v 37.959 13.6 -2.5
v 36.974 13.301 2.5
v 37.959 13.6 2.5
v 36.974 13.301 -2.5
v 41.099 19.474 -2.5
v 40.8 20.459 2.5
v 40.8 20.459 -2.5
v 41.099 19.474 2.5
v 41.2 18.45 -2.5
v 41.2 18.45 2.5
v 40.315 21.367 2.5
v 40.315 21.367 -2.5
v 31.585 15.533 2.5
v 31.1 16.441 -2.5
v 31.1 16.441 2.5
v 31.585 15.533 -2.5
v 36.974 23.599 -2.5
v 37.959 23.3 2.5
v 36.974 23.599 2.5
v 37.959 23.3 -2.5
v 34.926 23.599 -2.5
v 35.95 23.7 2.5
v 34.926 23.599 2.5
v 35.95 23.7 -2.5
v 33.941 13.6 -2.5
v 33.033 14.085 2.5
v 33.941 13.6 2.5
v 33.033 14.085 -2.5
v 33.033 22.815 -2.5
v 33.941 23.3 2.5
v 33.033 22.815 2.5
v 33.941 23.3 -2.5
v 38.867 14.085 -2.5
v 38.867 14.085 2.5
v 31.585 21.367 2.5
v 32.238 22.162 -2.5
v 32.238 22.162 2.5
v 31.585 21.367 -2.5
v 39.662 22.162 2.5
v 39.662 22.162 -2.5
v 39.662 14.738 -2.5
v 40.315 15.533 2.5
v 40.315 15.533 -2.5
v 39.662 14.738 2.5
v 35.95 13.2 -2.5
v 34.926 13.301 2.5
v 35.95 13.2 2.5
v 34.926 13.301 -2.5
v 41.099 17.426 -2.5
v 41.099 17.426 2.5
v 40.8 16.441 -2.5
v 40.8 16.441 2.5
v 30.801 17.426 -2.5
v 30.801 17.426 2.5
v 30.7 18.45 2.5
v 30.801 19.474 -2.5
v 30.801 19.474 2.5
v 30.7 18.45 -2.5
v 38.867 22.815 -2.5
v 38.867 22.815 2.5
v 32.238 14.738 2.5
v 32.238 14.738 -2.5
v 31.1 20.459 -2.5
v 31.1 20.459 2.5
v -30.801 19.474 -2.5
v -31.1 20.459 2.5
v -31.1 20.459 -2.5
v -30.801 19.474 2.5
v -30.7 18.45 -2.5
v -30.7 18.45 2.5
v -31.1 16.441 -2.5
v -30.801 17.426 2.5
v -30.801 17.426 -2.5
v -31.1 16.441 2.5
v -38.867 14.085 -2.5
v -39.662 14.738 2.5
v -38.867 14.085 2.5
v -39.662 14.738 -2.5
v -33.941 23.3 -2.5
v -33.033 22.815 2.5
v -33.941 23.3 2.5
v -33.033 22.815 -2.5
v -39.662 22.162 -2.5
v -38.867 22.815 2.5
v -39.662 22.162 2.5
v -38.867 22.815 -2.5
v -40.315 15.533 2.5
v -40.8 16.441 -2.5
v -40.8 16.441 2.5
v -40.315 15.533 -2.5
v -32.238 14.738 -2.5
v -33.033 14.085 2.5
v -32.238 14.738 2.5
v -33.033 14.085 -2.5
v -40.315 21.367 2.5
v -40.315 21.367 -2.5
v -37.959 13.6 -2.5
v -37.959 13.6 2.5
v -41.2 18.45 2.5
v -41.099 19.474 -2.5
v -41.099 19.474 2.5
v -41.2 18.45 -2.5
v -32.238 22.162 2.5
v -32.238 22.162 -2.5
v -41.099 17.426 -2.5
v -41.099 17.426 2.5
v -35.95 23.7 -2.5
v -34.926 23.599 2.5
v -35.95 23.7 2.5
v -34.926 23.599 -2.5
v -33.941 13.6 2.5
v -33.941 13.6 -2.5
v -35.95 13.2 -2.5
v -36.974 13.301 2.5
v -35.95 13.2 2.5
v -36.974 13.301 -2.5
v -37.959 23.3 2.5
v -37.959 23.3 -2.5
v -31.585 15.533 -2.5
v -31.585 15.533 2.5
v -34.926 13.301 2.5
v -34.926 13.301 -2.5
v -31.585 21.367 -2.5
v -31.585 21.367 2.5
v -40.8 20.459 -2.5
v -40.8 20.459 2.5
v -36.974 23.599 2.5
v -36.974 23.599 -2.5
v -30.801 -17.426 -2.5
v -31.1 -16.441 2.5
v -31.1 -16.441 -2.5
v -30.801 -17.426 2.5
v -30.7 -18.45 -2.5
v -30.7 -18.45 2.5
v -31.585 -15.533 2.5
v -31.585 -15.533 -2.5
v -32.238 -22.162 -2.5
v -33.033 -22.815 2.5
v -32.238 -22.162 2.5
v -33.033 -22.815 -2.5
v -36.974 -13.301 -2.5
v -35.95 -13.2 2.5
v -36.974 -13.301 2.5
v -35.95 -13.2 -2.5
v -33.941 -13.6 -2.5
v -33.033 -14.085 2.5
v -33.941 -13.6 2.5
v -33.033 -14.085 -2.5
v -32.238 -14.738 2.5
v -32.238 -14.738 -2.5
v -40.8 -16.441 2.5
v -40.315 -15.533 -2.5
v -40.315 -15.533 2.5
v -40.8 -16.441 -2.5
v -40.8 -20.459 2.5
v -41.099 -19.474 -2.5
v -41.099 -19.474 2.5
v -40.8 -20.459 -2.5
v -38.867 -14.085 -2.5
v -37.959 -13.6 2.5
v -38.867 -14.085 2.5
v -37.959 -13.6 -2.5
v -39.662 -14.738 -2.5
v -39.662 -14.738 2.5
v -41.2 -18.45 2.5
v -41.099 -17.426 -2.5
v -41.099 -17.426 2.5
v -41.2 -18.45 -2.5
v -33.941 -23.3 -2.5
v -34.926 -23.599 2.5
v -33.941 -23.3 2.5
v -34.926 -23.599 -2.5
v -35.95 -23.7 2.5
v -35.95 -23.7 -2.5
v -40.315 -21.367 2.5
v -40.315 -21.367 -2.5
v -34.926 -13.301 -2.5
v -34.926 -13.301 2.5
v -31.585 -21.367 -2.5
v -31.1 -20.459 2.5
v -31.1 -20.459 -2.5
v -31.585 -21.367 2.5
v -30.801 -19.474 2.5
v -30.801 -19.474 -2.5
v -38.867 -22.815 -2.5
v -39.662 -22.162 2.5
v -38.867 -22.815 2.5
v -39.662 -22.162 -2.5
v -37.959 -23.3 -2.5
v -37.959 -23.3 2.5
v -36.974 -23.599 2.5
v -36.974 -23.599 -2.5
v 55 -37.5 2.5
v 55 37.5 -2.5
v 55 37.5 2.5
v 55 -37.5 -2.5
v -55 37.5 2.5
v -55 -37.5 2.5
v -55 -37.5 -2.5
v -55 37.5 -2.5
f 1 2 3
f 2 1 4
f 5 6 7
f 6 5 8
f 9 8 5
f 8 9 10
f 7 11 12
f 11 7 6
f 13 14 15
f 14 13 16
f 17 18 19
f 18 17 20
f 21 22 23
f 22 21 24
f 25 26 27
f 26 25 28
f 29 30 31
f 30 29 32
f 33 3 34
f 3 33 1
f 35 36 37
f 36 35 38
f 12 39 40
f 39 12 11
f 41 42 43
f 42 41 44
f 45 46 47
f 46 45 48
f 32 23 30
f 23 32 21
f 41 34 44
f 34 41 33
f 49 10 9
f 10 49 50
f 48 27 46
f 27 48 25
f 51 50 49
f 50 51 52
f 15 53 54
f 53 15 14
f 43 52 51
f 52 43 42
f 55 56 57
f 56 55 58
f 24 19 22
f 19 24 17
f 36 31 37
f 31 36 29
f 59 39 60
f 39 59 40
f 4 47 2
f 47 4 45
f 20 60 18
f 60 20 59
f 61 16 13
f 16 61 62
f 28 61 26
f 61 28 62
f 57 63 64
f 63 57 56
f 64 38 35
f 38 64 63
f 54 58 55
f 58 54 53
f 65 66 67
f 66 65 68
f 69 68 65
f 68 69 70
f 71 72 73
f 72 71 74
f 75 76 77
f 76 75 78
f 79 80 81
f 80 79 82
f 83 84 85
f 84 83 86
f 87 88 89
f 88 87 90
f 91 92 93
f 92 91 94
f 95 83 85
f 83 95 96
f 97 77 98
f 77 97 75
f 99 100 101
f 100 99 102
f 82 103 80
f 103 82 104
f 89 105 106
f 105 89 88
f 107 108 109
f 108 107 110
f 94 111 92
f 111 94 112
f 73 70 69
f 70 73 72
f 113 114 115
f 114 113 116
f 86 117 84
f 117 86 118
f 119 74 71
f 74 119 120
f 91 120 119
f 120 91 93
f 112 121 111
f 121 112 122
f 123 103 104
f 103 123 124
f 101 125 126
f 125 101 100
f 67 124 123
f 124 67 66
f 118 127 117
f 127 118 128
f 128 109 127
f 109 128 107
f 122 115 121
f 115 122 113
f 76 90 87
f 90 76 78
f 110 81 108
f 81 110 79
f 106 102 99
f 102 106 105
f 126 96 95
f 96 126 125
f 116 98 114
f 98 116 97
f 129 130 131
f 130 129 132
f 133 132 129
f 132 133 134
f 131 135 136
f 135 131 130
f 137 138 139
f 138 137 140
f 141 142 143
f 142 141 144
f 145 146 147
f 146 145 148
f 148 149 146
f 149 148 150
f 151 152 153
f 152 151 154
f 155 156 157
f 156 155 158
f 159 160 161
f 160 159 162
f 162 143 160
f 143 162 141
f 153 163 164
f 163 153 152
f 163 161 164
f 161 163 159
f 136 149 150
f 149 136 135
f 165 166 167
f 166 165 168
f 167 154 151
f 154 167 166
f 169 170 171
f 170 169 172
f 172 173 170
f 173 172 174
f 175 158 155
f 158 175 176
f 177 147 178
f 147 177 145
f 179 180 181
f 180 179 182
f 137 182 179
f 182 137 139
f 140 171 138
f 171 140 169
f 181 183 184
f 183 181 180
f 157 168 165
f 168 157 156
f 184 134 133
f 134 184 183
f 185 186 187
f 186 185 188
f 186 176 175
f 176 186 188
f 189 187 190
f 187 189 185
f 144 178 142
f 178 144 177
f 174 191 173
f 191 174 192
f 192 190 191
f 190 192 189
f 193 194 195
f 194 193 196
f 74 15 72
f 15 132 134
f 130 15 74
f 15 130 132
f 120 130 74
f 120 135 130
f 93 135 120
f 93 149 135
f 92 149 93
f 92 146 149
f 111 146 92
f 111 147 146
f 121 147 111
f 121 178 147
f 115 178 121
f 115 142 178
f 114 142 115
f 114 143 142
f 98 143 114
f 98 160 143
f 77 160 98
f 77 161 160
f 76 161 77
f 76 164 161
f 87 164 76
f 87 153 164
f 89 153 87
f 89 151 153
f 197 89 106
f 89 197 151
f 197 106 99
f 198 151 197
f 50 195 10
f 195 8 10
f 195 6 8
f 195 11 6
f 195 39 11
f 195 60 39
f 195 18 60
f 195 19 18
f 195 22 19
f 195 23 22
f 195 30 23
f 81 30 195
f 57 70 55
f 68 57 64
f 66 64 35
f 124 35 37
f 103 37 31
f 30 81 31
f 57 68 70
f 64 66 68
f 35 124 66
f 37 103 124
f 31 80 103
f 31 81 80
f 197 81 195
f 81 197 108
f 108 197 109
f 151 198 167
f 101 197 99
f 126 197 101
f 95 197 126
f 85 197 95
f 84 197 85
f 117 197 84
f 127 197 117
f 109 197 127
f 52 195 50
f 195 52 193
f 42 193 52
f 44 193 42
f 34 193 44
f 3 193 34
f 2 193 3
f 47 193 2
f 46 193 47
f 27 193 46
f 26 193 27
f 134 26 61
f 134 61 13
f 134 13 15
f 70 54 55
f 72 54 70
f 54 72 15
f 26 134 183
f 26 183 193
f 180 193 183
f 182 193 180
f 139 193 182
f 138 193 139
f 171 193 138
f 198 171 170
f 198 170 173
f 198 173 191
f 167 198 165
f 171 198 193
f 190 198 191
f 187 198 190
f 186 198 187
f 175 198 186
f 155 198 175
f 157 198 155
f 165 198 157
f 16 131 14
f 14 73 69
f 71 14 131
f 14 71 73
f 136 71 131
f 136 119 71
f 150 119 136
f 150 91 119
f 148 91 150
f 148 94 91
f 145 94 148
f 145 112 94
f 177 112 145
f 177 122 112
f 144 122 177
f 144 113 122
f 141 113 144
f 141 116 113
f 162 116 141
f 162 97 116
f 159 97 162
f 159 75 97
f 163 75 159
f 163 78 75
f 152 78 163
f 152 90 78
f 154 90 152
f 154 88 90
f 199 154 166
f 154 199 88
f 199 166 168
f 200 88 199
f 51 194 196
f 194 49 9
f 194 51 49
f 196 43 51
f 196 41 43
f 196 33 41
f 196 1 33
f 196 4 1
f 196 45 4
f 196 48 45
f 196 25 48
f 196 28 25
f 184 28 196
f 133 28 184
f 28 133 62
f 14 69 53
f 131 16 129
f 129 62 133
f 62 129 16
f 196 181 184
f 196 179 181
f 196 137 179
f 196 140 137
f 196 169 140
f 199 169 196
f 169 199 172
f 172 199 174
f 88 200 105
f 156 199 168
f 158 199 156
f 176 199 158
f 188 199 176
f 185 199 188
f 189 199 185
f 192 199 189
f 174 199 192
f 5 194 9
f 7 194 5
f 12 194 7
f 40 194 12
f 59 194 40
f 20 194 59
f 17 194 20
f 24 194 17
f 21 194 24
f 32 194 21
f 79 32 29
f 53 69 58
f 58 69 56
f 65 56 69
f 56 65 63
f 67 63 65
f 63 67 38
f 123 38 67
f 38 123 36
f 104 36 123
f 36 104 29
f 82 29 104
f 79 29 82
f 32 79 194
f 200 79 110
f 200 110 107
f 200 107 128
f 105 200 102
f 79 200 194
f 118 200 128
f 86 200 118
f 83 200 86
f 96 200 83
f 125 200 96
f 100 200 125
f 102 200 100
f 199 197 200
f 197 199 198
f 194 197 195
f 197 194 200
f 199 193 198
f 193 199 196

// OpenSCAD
$fn = 32;

// ----------------------------------------------------------------------
// Corner plate 110 x 75 x 5
// 3 holes, centres taken from the edge offset
// ----------------------------------------------------------------------

// --- parameters (mm) ---
plate = [110, 75, 5];  // overall size (x, y, z)
holes = 3;             // number of holes the drawing asks for
hole_d = 10.5;         // hole diameter
edge = 19.05;          // hole centre offset from the plate edge

// --- derived feature positions (mm) ---
corner_x = plate[0] / 2 - edge;  // = 35.95   corner hole X
corner_y = plate[1] / 2 - edge;  // = 18.45   corner hole Y
feature_centers = [
  [corner_x, corner_y],
  [-corner_x, corner_y],
  [-corner_x, -corner_y]
];   // hole centres the loop below drills

// plate outline, every hole drilled through with the same cutters
difference() {
  cube(plate, center = true);
  for (centre = feature_centers)
    translate([centre[0], centre[1], 0])
      cylinder(d = hole_d, h = plate[2] + 2, center = true);
}
